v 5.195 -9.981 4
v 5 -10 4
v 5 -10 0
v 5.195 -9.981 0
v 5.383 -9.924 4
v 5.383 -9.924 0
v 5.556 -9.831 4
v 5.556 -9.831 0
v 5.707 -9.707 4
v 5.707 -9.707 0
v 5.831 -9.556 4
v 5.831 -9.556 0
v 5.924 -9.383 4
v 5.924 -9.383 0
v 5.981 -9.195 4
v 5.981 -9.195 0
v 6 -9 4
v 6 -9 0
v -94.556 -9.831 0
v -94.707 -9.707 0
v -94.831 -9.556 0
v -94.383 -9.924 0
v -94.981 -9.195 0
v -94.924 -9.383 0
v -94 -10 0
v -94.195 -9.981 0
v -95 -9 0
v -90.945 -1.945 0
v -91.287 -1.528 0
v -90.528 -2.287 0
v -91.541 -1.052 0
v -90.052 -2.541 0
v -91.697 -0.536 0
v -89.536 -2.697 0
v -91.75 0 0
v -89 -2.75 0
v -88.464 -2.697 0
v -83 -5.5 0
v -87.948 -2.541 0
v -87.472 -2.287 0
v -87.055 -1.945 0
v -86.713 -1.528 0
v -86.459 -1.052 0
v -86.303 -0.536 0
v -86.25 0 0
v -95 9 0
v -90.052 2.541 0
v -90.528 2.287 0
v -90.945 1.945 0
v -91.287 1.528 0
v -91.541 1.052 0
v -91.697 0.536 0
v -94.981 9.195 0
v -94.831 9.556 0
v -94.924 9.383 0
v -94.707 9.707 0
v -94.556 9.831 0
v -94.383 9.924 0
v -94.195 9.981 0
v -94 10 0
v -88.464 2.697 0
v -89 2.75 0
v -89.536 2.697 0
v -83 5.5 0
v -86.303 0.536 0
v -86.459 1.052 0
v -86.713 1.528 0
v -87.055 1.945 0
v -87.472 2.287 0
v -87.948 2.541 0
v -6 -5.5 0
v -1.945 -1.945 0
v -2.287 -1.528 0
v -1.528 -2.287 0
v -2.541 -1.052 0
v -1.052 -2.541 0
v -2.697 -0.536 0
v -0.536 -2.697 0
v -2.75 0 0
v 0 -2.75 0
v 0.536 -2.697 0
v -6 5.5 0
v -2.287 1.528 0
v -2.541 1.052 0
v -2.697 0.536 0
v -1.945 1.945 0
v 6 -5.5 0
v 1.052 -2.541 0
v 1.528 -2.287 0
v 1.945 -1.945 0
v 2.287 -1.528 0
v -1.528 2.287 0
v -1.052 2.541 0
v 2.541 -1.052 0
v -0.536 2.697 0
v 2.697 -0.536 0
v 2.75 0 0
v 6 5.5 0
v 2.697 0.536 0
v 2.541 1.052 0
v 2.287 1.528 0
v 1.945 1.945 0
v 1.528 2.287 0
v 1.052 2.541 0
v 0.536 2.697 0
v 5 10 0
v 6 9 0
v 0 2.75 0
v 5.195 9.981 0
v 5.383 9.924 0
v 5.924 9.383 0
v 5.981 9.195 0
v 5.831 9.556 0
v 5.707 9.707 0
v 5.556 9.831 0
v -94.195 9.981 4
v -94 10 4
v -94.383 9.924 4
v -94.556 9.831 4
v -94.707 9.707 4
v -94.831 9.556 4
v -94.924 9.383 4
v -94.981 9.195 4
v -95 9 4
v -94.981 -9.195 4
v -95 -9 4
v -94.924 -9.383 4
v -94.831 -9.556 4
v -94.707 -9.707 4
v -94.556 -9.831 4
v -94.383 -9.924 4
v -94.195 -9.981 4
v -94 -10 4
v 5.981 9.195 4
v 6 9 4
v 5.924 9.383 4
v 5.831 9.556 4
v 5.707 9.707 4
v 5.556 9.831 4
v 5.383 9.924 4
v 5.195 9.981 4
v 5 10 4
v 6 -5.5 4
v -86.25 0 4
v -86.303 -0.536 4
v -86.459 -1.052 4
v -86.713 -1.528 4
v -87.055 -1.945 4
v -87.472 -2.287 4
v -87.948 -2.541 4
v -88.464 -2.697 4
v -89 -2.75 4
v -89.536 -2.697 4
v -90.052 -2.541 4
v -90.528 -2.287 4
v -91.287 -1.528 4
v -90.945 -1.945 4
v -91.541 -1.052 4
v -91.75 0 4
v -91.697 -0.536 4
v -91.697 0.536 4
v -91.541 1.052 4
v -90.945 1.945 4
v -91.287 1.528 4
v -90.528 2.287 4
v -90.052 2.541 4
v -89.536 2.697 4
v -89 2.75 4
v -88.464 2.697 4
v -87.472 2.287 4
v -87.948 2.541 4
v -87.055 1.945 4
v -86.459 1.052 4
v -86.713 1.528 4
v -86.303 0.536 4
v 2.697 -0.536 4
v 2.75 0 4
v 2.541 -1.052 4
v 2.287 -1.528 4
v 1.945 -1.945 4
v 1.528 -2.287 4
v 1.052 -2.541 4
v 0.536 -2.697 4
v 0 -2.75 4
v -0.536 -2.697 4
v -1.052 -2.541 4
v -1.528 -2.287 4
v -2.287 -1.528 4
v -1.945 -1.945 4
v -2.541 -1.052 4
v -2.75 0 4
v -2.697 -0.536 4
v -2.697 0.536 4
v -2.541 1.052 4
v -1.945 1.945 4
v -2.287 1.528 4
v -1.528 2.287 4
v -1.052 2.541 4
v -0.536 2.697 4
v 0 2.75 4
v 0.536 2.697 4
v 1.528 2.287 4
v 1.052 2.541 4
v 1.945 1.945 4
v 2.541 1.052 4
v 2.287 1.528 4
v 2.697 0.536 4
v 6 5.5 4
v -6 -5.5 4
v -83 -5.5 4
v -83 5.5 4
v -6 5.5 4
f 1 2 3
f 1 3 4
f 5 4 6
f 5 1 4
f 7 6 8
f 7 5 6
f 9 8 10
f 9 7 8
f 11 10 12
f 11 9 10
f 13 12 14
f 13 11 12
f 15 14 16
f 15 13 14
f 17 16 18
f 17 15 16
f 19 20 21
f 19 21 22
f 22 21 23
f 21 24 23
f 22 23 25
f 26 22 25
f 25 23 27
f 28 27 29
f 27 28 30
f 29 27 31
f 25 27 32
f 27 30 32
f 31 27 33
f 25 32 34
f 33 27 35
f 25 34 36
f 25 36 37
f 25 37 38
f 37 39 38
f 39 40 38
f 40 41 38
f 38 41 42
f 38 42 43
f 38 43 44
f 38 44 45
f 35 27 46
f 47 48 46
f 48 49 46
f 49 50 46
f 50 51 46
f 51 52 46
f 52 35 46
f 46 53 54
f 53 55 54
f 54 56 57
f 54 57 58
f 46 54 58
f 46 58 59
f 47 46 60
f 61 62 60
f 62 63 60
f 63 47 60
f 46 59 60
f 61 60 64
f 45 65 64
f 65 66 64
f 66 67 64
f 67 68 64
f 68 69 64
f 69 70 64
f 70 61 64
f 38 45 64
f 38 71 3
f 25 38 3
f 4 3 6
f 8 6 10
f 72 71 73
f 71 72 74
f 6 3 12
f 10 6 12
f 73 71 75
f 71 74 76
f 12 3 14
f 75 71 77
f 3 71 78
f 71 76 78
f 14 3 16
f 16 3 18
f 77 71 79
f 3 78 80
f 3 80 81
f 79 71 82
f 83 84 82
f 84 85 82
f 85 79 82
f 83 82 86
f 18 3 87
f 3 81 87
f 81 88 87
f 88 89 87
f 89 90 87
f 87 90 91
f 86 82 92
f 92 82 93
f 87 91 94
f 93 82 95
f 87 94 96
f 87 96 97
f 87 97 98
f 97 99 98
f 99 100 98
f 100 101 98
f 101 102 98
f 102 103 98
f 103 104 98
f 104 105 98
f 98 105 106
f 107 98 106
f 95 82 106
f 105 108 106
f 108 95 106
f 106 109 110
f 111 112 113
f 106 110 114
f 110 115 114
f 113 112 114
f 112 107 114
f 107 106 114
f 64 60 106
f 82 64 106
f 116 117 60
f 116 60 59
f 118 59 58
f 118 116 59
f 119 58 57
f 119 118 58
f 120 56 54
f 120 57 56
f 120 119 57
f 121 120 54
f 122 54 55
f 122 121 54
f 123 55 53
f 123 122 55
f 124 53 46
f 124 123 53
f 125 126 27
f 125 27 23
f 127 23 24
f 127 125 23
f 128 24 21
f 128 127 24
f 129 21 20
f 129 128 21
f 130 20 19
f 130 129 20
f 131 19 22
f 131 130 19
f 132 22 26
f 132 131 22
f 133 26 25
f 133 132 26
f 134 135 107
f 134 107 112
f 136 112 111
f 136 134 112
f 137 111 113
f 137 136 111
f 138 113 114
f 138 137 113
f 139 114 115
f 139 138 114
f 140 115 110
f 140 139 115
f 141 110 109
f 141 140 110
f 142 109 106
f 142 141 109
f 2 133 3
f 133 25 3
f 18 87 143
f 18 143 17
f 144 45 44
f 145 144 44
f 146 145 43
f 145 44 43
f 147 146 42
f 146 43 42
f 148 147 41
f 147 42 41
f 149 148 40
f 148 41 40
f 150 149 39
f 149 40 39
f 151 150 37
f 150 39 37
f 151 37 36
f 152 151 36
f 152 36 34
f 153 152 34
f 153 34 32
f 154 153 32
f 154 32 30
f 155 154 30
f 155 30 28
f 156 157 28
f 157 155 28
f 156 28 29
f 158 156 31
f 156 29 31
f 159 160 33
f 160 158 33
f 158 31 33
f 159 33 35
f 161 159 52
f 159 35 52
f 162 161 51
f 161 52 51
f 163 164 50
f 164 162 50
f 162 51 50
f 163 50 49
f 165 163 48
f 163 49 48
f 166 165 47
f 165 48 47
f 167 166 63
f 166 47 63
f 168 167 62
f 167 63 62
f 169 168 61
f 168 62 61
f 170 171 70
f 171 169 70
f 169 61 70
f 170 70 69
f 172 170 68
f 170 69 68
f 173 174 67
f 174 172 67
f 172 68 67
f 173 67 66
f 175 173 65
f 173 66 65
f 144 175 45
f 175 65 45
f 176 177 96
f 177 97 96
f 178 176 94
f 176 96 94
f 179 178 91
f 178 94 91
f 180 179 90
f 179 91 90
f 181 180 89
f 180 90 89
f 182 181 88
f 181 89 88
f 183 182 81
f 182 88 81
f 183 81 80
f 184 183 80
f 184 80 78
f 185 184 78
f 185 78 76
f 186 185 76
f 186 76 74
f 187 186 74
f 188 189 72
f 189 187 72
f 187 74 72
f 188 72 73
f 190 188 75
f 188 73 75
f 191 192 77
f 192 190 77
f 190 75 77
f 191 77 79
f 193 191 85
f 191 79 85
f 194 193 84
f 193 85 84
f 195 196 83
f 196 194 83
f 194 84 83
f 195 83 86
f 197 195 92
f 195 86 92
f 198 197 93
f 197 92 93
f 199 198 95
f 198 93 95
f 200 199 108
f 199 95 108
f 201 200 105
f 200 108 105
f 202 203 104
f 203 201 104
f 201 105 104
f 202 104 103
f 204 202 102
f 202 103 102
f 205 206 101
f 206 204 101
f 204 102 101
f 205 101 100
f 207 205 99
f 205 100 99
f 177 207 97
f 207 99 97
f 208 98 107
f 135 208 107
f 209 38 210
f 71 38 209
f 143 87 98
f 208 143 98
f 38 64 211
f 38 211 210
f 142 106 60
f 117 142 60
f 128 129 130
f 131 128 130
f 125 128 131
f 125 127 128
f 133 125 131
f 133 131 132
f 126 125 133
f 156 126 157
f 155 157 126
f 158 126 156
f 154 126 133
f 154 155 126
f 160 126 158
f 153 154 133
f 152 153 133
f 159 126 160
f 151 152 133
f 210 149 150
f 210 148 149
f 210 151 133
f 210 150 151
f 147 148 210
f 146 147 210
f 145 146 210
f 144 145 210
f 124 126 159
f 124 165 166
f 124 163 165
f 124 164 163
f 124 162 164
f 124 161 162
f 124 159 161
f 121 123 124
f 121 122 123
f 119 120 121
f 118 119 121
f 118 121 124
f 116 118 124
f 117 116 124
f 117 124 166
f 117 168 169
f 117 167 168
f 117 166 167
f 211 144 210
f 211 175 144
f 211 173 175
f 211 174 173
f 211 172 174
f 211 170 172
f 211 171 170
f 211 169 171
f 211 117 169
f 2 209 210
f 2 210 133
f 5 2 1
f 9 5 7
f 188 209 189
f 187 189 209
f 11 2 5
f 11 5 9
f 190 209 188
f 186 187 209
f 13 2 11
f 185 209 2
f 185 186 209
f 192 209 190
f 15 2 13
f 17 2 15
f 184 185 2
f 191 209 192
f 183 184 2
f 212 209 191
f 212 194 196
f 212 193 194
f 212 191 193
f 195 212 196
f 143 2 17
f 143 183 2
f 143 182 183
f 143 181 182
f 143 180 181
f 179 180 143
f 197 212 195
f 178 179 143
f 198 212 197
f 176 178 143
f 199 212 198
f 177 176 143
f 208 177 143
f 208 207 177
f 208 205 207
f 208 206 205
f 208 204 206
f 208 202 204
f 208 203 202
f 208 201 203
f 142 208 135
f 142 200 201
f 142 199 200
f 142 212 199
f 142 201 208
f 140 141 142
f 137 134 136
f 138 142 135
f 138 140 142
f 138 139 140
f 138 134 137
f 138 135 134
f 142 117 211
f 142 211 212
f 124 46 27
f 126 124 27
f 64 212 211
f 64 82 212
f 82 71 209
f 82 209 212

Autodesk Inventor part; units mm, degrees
ref_plane "YZ Plane" through (0, 0, 0) normal (1, 0, 0) x (0, 1, 0)
ref_plane "XZ Plane" through (0, 0, 0) normal (0, 1, 0) x (-1, 0, 0)
ref_plane "XY Plane" through (0, 0, 0) normal (0, 0, 1) x (1, 0, 0)
sketch "Sketch1" plane through (0, 0, 0) normal (0, 0, 1) x (1, 0, 0)
  line L0 (-95, -10) -> (95, -10)
  line L1 (95, -10) -> (95, 10)
  line L2 (95, 10) -> (-95, 10)
  line L3 (-95, 10) -> (-95, -10)
  line L4 (-95, -10) -> (95, 10) construction
  line L5 (95, -10) -> (-95, 10) construction
  line L6 (-133, 0) -> (133, 0) construction
  line L7 (-83, -5.5) -> (-6, -5.5)
  line L8 (-6, -5.5) -> (-6, 5.5)
  line L9 (-6, 5.5) -> (-83, 5.5)
  line L10 (-83, 5.5) -> (-83, -5.5)
  line L11 (-83, -5.5) -> (-6, 5.5) construction
  line L12 (-6, -5.5) -> (-83, 5.5) construction
  line L13 (0, 14.2899) -> (0, -14.2899) construction
  line L14 (83, -5.5) -> (6, -5.5)
  line L15 (6, -5.5) -> (6, 5.5)
  line L16 (6, 5.5) -> (83, 5.5)
  line L17 (83, 5.5) -> (83, -5.5)
  line L18 (83, -5.5) -> (6, 5.5) construction
  line L19 (6, -5.5) -> (83, 5.5) construction
  circle A0 centre (-89, 0) radius 2.75
  circle A1 centre (0, 0) radius 2.75
  circle A2 centre (89, 0) radius 2.75
  line L20 (6, 5.5) -> (6, 10)
  line L21 (6, -5.5) -> (6, -10)
  point P0 (-44.5, 0)
  point P1 (44.5, 0)
  dimension "d0" = 190
  dimension "d1" = 20
  dimension "d2" = 11
  dimension "d3" = 12
  dimension "d4" = 6
  dimension "d5" = 5.5
  dimension "d6" = 6
  dimension "d7" = 5.5
extrude "Extrusion1" add sketch "Sketch1" along normal blind 4 contours L3 L2 L20 L15 L21 L0
fillet "Fillet1" radius 1 4 edges at (-95, -10, 2) (-95, 10, 2) (6, -10, 2) (6, 10, 2)
sketch "Sketch2" plane through (0, 0, 4) normal (0, 0, 1) x (1, 0, 0)
  arc A0 (6, 9) -> (5, 10) centre (5, 9) ccw projected
  line L0 (5, 10) -> (-94, 10) projected
  arc A1 (-94, 10) -> (-95, 9) centre (-94, 9) ccw projected
  line L1 (-95, 9) -> (-95, -9) projected
  arc A2 (-95, -9) -> (-94, -10) centre (-94, -9) ccw projected
  line L2 (-94, -10) -> (5, -10) projected
  arc A3 (5, -10) -> (6, -9) centre (5, -9) ccw projected
  line L3 (6, -9) -> (6, 9) projected
  circle A4 centre (-89, 0) radius 2.75 projected
  circle A5 centre (0, 0) radius 2.75 projected
  line L4 (-83, -5.5) -> (-83, 5.5) projected
  line L5 (-83, 5.5) -> (-6, 5.5) projected
  line L6 (-6, 5.5) -> (-6, -5.5) projected
  line L7 (-6, -5.5) -> (-83, -5.5) projected
equation "\"d6\" = 0.5 * d3"
equation "\"d7\" = d5"
properties part number "LED_Holder_BackBot"
